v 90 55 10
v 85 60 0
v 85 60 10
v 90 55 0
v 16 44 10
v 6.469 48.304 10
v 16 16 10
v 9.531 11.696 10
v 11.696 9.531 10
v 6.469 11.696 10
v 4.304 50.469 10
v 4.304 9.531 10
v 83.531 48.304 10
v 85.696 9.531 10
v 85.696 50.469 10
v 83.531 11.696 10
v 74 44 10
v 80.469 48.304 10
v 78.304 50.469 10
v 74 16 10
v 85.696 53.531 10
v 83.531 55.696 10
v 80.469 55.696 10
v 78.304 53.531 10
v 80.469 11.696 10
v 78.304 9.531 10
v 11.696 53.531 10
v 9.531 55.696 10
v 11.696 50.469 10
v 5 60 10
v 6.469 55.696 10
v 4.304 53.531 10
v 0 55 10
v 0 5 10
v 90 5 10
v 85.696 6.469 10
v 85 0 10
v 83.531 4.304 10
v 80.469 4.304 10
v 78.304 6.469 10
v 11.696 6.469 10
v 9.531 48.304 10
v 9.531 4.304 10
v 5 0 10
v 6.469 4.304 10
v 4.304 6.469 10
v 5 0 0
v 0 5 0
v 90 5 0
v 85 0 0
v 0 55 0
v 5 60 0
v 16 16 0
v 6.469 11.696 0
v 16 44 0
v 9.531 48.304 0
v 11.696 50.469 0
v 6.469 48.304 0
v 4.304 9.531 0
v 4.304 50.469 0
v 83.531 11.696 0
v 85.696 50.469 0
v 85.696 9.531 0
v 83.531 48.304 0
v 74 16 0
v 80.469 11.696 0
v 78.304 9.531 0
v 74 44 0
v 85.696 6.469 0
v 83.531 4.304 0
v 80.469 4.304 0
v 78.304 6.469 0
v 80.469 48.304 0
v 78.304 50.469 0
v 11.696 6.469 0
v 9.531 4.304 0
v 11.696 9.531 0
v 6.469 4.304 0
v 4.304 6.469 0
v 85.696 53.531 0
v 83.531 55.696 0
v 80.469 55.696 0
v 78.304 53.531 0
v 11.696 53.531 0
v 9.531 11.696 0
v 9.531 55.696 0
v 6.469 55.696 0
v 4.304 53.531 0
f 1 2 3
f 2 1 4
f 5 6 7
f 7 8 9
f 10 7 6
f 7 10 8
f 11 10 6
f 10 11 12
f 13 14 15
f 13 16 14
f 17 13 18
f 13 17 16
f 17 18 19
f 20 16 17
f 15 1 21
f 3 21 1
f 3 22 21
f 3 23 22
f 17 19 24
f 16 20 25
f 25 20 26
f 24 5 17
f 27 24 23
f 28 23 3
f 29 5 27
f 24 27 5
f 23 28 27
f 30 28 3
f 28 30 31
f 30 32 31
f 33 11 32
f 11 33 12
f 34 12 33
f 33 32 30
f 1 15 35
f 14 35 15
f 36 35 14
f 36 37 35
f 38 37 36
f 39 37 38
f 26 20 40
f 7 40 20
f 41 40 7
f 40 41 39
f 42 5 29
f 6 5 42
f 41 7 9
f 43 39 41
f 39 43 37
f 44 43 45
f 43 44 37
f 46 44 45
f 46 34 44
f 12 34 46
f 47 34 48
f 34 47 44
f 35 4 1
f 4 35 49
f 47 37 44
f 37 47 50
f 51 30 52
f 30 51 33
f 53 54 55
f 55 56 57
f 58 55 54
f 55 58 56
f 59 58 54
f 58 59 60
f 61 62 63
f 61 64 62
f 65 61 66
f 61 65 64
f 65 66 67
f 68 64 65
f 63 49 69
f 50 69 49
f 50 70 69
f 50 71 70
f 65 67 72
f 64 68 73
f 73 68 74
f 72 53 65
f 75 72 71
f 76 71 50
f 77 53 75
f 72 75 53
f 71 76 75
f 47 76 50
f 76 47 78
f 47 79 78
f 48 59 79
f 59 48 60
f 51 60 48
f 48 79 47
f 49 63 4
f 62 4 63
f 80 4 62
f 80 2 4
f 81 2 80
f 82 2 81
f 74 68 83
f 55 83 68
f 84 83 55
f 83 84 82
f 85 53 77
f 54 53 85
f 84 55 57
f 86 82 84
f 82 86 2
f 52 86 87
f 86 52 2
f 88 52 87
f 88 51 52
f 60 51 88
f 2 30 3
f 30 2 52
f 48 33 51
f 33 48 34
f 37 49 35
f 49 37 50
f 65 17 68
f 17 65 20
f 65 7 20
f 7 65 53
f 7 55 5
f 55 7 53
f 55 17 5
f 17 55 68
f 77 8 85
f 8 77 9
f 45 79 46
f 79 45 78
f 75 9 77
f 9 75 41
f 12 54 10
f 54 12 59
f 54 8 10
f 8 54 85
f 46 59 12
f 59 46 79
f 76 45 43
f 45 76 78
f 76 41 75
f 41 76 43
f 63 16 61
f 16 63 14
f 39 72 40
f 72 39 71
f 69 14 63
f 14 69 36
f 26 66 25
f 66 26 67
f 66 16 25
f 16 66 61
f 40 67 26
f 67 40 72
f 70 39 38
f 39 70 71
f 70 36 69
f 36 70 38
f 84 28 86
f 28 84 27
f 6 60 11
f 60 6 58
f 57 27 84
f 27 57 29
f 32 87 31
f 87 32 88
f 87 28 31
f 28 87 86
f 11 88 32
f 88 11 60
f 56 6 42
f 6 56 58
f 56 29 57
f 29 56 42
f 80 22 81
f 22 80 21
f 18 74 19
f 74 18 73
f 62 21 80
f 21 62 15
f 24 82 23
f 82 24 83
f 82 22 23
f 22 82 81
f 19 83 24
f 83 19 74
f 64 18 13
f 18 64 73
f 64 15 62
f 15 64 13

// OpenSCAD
$fn = 32;

// ----------------------------------------------------------------------
// Frame plate: 90 x 60 frame, 16 mm rails
// ----------------------------------------------------------------------

// --- parameters (mm) ---
plate_l = 90;             // plate length, X
plate_w = 60;             // plate width, Y
plate_t = 10;             // plate thickness, Z (extrusion height)
corner_c = 5;             // corner chamfer
frame_bar = 16;           // frame rail width
bolt_r = 4;               // corner bolt window radius
bolt_inset = 8;           // bolt centre inset from the edges
fit_tol = 0.1;            // declared fit tolerance (prompt contract)
free_tol = 0.5;           // declared free tolerance (prompt contract)

win_l = plate_l - 2 * frame_bar;  // window length
win_w = plate_w - 2 * frame_bar;  // window width
bolt_d = 2 * bolt_r;  // corner hole diameter

profile = [[5, 0], [85, 0], [90, 5], [90, 55], [85, 60], [5, 60], [0, 55], [0, 5]];  // primary outline, 8 points, counter clockwise
void_1 = [[16, 16], [74, 16], [74, 44], [16, 44]];  // the window, 4 points
void_2 = [[11.696, 9.531], [9.531, 11.696], [6.469, 11.696], [4.304, 9.531], [4.304, 6.469], [6.469, 4.304], [9.531, 4.304], [11.696, 6.469]];  // corner bolt window, 8 points
void_3 = [[85.696, 9.531], [83.531, 11.696], [80.469, 11.696], [78.304, 9.531], [78.304, 6.469], [80.469, 4.304], [83.531, 4.304], [85.696, 6.469]];  // corner bolt window, 8 points
void_4 = [[11.696, 53.531], [9.531, 55.696], [6.469, 55.696], [4.304, 53.531], [4.304, 50.469], [6.469, 48.304], [9.531, 48.304], [11.696, 50.469]];  // corner bolt window, 8 points
void_5 = [[85.696, 53.531], [83.531, 55.696], [80.469, 55.696], [78.304, 53.531], [78.304, 50.469], [80.469, 48.304], [83.531, 48.304], [85.696, 50.469]];  // corner bolt window, 8 points

// --- the one profile operation ---
difference() {
  linear_extrude(height = plate_t) polygon(points = profile);
  translate([0, 0, -1])
    linear_extrude(height = plate_t + 2) polygon(points = void_1);
  translate([0, 0, -1])
    linear_extrude(height = plate_t + 2) polygon(points = void_2);
  translate([0, 0, -1])
    linear_extrude(height = plate_t + 2) polygon(points = void_3);
  translate([0, 0, -1])
    linear_extrude(height = plate_t + 2) polygon(points = void_4);
  translate([0, 0, -1])
    linear_extrude(height = plate_t + 2) polygon(points = void_5);
}
